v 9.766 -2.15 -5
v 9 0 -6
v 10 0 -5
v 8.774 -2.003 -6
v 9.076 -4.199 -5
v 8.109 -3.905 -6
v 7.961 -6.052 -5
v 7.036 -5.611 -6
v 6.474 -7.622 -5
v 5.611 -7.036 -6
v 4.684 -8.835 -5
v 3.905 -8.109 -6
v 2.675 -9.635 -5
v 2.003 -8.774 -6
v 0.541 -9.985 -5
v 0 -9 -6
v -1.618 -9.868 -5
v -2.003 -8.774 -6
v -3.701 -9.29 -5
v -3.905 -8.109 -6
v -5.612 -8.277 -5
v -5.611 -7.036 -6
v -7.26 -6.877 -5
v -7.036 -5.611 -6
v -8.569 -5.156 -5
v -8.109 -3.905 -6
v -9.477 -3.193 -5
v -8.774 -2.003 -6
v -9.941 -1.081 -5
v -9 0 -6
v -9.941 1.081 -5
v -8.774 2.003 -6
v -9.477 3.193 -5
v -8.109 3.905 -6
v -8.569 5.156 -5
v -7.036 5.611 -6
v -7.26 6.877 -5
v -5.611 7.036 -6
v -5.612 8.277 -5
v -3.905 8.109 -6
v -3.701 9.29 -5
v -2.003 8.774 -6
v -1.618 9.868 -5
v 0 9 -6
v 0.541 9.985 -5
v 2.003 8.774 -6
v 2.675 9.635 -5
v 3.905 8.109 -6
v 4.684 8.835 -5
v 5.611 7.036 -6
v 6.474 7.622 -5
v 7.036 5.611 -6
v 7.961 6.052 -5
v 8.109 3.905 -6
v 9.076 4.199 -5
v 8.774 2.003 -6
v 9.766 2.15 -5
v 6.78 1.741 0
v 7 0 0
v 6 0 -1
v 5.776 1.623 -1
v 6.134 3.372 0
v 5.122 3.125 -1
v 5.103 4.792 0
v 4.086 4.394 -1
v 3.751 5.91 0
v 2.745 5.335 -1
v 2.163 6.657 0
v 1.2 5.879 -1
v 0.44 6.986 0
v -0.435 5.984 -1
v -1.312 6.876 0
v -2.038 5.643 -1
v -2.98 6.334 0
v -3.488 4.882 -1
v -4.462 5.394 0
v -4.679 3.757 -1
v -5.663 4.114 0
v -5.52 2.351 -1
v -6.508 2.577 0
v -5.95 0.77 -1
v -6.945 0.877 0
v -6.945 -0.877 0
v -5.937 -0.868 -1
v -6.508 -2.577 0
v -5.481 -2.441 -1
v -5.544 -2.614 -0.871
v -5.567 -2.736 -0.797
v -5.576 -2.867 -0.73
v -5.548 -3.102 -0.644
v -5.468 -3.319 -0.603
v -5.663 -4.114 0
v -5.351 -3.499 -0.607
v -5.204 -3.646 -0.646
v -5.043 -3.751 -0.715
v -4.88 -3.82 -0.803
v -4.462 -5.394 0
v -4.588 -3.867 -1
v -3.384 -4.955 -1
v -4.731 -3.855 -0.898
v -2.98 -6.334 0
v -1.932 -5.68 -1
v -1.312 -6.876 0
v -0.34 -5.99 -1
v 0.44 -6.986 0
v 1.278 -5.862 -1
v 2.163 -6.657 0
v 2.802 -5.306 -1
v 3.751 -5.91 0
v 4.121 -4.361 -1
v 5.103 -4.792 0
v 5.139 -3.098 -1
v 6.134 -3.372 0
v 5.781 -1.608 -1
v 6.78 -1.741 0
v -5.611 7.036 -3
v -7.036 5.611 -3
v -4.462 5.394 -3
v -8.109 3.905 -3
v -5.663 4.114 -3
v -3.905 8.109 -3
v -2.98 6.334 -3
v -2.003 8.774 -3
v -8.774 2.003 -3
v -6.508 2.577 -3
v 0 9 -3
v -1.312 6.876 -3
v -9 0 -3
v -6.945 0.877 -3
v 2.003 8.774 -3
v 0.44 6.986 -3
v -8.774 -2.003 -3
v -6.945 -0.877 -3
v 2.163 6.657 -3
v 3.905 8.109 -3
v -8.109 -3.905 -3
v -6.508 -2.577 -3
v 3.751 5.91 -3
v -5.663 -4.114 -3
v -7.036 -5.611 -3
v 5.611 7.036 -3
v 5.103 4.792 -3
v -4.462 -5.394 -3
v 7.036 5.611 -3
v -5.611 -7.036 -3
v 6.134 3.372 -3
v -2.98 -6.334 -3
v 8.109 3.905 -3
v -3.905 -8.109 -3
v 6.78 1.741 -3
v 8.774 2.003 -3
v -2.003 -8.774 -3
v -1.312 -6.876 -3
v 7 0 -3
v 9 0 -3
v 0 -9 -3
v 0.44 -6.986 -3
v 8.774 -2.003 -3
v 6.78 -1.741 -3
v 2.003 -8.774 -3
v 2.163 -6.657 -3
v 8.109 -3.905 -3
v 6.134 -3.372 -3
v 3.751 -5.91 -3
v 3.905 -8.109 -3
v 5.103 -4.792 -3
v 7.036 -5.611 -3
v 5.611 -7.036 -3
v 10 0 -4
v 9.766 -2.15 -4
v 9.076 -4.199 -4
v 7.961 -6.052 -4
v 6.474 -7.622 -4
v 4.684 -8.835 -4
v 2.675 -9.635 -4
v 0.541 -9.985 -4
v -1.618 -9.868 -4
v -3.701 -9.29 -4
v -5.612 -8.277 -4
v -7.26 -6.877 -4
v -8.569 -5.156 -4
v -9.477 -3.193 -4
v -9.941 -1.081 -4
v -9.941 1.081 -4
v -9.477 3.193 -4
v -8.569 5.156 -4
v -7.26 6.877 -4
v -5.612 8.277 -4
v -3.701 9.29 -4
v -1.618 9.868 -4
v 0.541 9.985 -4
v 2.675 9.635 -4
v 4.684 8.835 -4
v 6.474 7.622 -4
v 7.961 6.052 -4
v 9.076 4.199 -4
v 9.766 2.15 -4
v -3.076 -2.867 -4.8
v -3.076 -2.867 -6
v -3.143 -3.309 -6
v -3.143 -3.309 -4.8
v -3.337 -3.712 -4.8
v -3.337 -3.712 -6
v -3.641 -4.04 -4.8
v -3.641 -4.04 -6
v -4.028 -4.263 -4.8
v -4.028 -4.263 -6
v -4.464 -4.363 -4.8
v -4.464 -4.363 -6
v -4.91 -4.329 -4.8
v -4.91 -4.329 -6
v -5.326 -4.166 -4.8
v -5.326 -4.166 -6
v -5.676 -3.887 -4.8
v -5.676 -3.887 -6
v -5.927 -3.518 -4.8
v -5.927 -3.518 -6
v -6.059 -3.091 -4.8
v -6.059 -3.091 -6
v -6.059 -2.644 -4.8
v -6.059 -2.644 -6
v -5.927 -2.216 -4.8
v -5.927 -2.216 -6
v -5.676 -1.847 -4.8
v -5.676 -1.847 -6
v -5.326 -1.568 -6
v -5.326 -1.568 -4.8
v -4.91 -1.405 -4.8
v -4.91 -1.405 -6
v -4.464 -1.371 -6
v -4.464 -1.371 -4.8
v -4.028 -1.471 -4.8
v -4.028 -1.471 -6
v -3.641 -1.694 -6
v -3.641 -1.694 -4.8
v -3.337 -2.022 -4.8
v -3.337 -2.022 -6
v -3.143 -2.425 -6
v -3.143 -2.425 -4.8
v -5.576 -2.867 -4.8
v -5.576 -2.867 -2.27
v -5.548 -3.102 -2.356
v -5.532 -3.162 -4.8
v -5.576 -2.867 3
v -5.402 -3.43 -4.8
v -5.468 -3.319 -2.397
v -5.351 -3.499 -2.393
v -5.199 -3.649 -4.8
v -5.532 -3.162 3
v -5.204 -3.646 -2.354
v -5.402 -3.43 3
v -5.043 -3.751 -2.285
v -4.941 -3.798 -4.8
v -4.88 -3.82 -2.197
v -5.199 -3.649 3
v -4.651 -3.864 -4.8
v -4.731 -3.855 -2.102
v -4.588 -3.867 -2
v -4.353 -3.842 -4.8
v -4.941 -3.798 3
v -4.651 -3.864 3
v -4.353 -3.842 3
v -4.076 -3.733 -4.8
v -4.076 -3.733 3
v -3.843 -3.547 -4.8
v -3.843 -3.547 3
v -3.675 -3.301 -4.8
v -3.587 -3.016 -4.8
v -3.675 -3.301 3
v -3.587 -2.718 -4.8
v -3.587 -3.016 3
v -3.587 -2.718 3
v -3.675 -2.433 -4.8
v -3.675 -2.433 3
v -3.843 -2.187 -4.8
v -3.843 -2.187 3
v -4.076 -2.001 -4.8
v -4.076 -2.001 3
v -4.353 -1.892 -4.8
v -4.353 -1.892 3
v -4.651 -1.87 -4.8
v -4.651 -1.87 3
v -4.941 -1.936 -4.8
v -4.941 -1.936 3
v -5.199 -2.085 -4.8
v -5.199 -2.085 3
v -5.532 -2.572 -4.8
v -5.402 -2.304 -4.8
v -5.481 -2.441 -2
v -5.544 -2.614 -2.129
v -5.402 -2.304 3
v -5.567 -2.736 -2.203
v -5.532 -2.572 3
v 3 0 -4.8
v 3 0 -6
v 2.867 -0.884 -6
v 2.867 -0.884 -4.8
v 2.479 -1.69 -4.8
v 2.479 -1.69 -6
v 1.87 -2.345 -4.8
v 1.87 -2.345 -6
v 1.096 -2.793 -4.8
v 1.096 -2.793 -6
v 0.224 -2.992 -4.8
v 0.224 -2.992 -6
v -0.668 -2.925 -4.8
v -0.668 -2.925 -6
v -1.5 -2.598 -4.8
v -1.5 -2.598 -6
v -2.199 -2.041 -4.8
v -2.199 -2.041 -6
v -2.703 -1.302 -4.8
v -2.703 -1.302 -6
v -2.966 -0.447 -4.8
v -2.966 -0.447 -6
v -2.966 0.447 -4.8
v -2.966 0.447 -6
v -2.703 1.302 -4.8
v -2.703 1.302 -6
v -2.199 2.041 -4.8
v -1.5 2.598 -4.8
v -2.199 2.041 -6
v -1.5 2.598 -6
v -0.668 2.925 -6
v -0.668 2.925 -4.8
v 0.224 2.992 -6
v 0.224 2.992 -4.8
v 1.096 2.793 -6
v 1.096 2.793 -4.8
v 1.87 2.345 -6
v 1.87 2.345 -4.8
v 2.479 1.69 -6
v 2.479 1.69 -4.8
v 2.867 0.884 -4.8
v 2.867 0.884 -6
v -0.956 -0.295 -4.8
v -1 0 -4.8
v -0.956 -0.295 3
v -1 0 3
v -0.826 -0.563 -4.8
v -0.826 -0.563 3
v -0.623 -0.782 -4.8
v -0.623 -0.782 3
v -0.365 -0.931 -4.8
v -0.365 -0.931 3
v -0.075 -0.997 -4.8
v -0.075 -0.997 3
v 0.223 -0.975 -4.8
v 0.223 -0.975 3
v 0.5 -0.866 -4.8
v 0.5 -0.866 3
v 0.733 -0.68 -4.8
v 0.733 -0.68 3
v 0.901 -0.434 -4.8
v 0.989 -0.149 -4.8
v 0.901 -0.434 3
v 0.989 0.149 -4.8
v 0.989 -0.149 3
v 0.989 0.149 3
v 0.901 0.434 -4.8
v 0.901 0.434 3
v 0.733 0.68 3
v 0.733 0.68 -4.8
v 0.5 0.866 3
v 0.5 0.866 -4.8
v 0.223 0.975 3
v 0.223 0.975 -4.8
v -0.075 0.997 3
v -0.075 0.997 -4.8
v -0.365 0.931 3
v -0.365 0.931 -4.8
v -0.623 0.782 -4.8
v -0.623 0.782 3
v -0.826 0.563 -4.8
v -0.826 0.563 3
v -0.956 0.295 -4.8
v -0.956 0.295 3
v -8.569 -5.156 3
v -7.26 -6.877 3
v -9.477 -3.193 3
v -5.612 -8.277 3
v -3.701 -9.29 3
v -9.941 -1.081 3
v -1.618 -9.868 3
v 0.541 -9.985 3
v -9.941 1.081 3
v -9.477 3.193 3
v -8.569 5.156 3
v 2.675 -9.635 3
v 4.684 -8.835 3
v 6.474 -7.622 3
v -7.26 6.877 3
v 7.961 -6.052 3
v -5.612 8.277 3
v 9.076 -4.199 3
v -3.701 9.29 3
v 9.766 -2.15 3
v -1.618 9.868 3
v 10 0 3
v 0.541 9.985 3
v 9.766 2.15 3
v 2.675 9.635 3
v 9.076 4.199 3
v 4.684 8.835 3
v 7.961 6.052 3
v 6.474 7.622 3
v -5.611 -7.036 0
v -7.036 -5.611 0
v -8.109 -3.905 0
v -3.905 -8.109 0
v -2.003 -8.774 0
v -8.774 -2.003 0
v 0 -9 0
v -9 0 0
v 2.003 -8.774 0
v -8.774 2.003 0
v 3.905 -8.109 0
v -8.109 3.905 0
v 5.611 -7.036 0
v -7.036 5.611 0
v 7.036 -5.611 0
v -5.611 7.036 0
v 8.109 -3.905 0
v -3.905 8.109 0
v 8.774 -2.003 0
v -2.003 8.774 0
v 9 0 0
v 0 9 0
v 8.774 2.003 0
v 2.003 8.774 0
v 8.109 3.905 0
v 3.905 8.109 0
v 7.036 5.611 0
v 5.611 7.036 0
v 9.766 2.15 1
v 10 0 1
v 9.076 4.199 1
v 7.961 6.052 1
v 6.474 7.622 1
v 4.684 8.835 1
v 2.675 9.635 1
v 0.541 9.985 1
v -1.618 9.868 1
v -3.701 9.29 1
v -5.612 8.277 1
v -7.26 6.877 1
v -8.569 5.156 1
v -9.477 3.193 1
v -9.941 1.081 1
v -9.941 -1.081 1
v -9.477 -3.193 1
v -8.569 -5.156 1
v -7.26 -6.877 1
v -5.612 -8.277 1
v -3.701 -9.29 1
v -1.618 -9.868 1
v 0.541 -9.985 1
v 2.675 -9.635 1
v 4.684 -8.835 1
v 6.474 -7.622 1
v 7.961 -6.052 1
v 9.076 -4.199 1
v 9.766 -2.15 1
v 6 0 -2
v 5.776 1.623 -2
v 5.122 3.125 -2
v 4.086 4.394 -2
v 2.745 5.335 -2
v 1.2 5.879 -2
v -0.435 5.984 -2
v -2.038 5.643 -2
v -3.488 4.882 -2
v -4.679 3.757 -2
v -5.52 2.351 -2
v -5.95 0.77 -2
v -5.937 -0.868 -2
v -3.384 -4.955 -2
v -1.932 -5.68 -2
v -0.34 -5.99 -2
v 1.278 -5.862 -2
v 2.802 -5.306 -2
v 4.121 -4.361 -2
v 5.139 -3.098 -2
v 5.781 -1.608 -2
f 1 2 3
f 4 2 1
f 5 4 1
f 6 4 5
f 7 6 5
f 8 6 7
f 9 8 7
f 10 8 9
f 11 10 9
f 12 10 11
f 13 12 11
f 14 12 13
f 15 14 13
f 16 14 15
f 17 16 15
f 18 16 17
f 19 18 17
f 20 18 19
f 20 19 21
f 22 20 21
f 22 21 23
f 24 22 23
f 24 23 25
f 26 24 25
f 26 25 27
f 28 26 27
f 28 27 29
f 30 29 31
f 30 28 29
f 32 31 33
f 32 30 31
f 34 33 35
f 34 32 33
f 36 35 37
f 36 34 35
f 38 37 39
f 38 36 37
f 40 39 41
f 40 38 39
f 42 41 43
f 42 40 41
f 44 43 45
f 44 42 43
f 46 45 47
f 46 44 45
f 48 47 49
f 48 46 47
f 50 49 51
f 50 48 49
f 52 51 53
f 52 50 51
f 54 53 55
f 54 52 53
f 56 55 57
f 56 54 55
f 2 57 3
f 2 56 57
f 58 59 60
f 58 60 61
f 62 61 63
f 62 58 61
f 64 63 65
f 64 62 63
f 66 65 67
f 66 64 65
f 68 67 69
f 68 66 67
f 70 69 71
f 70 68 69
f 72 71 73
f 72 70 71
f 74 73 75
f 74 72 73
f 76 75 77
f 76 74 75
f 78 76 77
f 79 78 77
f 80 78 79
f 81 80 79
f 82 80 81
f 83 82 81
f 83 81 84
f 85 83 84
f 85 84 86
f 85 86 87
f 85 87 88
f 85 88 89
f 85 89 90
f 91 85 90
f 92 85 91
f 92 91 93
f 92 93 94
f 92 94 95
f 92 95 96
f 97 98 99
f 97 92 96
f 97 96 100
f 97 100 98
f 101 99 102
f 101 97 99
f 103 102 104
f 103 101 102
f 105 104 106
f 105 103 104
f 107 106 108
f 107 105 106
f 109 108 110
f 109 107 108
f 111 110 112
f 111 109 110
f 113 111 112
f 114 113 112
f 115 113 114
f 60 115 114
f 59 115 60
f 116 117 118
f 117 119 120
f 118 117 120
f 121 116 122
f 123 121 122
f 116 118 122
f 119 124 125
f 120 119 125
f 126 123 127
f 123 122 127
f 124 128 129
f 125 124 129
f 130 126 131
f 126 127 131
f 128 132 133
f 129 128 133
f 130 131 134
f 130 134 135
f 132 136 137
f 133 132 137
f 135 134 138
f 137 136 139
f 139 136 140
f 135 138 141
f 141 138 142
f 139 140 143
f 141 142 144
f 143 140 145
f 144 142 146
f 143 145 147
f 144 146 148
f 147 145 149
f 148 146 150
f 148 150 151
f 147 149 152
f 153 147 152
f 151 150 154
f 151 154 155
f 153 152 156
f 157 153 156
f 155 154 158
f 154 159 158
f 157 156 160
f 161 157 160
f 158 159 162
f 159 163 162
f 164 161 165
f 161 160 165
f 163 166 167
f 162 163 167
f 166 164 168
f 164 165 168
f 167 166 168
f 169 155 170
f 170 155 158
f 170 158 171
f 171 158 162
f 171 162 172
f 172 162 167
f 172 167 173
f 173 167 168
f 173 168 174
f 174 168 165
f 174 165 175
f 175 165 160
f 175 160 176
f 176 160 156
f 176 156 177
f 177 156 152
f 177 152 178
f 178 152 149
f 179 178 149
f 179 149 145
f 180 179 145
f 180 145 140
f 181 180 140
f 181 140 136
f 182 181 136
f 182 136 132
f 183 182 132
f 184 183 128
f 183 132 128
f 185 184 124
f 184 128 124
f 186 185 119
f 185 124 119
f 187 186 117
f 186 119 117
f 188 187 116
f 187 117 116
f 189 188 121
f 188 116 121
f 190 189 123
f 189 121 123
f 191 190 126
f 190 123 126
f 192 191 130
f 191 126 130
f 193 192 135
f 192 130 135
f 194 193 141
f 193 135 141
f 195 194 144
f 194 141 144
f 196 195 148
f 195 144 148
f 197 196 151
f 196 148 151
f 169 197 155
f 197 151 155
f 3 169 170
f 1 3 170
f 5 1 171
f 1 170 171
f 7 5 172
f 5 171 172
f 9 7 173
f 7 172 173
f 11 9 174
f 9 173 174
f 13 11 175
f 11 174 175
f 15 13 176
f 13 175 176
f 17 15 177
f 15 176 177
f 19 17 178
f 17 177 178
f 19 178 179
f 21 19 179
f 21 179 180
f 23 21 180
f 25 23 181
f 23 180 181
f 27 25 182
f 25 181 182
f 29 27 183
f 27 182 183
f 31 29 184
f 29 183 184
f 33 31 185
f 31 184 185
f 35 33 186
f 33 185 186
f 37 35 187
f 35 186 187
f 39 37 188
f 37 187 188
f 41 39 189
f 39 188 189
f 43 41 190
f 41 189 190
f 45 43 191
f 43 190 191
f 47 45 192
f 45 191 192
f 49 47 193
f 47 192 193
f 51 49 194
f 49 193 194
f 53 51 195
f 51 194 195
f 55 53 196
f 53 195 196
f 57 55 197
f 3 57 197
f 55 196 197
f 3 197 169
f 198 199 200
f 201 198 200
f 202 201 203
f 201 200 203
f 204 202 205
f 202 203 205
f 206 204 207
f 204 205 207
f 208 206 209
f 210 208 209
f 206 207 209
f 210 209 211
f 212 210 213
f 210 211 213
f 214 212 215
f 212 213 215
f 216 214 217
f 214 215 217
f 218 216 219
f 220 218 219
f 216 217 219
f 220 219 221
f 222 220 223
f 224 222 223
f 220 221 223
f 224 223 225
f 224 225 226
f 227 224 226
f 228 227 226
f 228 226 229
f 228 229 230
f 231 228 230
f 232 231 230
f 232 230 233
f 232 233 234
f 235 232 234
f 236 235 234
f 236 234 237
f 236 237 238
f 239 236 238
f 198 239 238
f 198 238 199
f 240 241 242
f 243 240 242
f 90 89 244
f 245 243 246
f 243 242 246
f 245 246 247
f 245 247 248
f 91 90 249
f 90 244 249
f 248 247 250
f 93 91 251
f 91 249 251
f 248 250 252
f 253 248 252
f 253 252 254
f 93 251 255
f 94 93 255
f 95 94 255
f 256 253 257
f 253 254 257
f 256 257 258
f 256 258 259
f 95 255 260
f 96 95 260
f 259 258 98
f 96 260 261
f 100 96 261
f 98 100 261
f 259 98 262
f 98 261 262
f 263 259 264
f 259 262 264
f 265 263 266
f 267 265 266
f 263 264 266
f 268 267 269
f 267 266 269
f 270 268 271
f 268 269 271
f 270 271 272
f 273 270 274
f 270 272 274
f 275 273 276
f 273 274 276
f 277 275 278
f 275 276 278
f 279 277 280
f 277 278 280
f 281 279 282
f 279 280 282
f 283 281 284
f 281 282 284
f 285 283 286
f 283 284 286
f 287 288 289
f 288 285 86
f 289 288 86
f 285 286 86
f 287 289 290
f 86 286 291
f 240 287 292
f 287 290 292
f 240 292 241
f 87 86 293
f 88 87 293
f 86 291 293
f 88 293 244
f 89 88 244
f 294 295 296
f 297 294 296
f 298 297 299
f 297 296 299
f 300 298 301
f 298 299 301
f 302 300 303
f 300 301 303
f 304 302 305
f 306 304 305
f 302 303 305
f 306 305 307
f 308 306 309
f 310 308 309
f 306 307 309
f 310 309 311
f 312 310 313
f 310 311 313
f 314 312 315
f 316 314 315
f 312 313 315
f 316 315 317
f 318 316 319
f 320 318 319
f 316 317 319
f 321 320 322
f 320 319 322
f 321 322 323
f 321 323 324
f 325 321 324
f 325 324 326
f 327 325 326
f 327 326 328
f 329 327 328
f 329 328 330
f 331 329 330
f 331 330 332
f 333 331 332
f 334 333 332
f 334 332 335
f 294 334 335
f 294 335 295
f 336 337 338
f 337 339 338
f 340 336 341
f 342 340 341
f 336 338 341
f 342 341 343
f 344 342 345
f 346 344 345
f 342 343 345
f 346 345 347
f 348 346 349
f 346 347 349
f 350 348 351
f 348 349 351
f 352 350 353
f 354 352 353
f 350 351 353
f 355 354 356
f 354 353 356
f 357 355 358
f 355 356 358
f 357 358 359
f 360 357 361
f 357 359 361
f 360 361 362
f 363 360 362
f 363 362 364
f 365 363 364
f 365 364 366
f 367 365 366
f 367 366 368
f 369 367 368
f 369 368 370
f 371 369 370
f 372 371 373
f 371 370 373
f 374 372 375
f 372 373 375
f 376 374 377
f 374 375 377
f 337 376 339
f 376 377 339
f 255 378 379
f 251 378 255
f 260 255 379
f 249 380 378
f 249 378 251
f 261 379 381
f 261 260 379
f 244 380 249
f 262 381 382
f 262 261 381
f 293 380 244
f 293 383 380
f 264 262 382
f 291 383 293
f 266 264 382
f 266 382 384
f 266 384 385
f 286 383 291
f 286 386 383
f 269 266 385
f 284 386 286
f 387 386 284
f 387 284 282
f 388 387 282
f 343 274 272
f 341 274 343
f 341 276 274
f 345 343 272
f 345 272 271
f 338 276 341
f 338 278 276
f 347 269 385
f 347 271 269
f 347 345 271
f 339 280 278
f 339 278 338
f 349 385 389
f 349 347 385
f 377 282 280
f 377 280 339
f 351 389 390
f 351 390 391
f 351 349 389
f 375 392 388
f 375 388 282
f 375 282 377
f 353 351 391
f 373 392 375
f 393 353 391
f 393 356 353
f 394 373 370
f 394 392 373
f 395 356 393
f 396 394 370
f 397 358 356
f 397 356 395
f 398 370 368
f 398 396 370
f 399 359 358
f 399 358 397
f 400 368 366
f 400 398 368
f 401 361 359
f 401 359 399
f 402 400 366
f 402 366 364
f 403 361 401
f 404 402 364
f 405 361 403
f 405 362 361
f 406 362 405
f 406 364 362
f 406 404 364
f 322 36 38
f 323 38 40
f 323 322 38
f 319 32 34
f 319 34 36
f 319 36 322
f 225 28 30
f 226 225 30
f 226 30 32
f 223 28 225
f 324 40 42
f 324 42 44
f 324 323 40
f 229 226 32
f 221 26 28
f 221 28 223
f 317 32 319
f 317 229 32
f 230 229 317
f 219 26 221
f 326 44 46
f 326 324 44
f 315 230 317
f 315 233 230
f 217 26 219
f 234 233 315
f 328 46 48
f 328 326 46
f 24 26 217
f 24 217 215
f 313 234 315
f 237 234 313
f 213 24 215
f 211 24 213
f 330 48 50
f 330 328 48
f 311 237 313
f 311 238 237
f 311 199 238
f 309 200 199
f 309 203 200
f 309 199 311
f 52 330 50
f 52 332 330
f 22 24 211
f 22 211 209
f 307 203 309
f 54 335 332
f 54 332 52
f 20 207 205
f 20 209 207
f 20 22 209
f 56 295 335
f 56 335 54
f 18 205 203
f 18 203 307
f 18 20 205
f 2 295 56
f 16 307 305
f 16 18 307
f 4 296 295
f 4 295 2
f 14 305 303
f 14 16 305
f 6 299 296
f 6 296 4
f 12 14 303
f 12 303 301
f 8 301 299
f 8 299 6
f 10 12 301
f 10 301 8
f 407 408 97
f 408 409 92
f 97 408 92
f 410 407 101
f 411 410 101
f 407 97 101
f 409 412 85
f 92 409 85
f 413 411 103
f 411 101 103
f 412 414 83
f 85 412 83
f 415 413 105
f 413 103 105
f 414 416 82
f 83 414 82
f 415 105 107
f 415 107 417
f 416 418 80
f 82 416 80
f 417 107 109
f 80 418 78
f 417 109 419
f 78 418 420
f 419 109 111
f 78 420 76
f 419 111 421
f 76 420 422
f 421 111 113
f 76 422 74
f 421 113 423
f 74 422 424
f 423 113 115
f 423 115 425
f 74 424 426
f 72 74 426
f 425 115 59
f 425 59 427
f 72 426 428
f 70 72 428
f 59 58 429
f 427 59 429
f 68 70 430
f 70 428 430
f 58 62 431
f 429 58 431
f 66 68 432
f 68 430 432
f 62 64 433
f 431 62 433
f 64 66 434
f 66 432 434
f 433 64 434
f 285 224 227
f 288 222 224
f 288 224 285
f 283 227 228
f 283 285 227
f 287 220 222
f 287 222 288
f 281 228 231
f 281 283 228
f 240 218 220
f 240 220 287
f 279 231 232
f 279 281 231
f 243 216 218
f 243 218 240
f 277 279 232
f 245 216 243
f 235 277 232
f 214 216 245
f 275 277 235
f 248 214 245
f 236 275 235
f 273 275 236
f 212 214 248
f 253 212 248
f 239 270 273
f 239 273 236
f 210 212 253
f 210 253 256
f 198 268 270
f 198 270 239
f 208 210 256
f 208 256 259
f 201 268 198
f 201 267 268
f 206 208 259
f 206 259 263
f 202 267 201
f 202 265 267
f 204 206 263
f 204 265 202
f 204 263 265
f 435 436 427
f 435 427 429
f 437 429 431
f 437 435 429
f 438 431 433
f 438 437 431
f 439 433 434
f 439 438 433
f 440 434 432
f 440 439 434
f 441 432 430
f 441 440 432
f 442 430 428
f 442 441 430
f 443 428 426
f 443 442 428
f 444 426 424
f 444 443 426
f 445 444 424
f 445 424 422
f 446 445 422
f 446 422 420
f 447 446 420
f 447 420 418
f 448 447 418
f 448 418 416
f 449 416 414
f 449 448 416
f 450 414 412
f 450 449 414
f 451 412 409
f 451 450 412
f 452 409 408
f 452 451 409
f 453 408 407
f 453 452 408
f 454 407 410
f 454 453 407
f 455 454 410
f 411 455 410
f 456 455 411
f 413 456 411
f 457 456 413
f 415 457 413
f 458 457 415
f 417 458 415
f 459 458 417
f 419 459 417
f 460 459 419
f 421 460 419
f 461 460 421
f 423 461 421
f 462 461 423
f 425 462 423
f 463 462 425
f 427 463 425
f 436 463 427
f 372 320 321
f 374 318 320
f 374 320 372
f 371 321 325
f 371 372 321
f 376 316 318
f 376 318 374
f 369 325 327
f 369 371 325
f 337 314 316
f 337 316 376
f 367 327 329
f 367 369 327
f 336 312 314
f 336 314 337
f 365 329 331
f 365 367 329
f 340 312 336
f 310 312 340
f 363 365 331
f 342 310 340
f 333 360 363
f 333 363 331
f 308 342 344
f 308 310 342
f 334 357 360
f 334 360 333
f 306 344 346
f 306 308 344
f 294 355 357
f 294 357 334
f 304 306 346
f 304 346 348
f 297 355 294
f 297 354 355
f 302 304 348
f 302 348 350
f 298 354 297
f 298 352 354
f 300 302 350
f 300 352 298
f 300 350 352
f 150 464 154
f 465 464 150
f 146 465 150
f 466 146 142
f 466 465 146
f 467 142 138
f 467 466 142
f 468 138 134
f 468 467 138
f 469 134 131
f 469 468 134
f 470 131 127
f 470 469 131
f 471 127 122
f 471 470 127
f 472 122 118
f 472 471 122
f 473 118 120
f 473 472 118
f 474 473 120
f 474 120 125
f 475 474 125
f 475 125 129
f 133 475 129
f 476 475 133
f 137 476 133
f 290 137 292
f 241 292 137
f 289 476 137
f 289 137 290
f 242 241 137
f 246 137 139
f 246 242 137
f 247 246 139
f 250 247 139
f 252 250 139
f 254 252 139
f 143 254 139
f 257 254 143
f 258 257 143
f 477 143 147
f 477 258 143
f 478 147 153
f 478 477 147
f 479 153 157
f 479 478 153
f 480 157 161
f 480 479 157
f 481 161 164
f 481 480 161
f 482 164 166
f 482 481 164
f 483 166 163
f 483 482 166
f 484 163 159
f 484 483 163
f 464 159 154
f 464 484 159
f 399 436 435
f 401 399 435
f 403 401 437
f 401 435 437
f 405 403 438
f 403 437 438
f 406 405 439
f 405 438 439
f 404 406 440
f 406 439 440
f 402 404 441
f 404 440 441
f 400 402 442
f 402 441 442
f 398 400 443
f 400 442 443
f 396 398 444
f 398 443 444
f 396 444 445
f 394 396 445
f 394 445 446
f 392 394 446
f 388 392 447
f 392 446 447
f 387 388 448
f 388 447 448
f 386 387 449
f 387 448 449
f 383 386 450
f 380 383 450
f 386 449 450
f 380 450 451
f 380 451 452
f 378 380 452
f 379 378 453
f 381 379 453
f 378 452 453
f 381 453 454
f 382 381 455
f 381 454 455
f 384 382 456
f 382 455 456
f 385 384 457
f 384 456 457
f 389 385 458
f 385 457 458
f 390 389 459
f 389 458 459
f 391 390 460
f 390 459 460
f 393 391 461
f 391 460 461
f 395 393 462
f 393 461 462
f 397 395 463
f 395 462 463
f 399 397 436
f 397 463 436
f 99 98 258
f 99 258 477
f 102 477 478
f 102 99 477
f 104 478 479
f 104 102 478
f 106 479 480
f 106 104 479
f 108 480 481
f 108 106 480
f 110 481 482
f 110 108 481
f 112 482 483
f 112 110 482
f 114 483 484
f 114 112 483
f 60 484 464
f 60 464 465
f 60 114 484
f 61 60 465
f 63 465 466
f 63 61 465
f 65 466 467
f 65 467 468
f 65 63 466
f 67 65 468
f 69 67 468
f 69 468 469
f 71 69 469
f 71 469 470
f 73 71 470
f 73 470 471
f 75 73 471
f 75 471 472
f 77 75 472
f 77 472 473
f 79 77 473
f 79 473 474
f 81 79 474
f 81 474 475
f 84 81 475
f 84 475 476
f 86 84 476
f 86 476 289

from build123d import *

# Parameters (mm, degrees)
F0_R            = 10
F1_DEPTH        = 3
F2_R            = 6
F3_DEPTH        = 3
F4_R            = 10
F4_R_2          = 6
F5_DEPTH        = 3
F6_SIZE         = 1
F8_D            = 2
F8_DEPTH        = 27
F8_CBORE_D      = 6
F8_CBORE_DEPTH  = 1.2
F8_TIP          = 0.600860619
F10_D           = 2
F10_DEPTH       = 9
F10_CBORE_D     = 3
F10_CBORE_DEPTH = 1.2
F10_TIP         = 0.600860619


with BuildPart() as f1:
    # F0 (on Top) → F1 (new body)
    with BuildSketch(Plane.XY):
        Circle(F0_R)
    extrude(amount=F1_DEPTH)

    # F2 (on face) → F3 (join)
    with BuildSketch(Plane.XY):
        Circle(F2_R)
    extrude(amount=-F3_DEPTH)

    # F4 (on face) → F5 (join)
    with BuildSketch(Plane(origin=(0, 0, -3), x_dir=(1, 0, 0), z_dir=(0, 0, -1))):
        Circle(F4_R)
        Circle(F4_R_2, mode=Mode.SUBTRACT)
        Circle(F4_R_2)
    extrude(amount=F5_DEPTH)

    # F6
    f6_edges = [f1.edges().sort_by_distance(p)[0] for p in [
        (-6, 0, 0),
        (-10, 0, -3),
        (-10, 0, 0),
        (-6, 0, -3),
        (-10, 0, -6),
    ]]
    chamfer(f6_edges, length=F6_SIZE)

    # F8
    with Locations(Plane(origin=(0, 0, -6), x_dir=(1, 0, 0), z_dir=(0, 0, -1))):
        with Locations((0, 0)):
            CounterBoreHole(F8_D / 2, F8_CBORE_D / 2, F8_CBORE_DEPTH, depth=F8_DEPTH)
            with Locations((0, 0, -(F8_DEPTH + F8_TIP / 2))):  # 118° drill point
                Cone(0, F8_D / 2, F8_TIP, mode=Mode.SUBTRACT)

    # F10
    with Locations(Plane(origin=(0, 0, -6), x_dir=(1, 0, 0), z_dir=(0, 0, -1))):
        with Locations((-4.575991758, 2.8671064562)):
            CounterBoreHole(F10_D / 2, F10_CBORE_D / 2, F10_CBORE_DEPTH, depth=F10_DEPTH)
            with Locations((0, 0, -(F10_DEPTH + F10_TIP / 2))):  # 118° drill point
                Cone(0, F10_D / 2, F10_TIP, mode=Mode.SUBTRACT)


solid = f1.part
